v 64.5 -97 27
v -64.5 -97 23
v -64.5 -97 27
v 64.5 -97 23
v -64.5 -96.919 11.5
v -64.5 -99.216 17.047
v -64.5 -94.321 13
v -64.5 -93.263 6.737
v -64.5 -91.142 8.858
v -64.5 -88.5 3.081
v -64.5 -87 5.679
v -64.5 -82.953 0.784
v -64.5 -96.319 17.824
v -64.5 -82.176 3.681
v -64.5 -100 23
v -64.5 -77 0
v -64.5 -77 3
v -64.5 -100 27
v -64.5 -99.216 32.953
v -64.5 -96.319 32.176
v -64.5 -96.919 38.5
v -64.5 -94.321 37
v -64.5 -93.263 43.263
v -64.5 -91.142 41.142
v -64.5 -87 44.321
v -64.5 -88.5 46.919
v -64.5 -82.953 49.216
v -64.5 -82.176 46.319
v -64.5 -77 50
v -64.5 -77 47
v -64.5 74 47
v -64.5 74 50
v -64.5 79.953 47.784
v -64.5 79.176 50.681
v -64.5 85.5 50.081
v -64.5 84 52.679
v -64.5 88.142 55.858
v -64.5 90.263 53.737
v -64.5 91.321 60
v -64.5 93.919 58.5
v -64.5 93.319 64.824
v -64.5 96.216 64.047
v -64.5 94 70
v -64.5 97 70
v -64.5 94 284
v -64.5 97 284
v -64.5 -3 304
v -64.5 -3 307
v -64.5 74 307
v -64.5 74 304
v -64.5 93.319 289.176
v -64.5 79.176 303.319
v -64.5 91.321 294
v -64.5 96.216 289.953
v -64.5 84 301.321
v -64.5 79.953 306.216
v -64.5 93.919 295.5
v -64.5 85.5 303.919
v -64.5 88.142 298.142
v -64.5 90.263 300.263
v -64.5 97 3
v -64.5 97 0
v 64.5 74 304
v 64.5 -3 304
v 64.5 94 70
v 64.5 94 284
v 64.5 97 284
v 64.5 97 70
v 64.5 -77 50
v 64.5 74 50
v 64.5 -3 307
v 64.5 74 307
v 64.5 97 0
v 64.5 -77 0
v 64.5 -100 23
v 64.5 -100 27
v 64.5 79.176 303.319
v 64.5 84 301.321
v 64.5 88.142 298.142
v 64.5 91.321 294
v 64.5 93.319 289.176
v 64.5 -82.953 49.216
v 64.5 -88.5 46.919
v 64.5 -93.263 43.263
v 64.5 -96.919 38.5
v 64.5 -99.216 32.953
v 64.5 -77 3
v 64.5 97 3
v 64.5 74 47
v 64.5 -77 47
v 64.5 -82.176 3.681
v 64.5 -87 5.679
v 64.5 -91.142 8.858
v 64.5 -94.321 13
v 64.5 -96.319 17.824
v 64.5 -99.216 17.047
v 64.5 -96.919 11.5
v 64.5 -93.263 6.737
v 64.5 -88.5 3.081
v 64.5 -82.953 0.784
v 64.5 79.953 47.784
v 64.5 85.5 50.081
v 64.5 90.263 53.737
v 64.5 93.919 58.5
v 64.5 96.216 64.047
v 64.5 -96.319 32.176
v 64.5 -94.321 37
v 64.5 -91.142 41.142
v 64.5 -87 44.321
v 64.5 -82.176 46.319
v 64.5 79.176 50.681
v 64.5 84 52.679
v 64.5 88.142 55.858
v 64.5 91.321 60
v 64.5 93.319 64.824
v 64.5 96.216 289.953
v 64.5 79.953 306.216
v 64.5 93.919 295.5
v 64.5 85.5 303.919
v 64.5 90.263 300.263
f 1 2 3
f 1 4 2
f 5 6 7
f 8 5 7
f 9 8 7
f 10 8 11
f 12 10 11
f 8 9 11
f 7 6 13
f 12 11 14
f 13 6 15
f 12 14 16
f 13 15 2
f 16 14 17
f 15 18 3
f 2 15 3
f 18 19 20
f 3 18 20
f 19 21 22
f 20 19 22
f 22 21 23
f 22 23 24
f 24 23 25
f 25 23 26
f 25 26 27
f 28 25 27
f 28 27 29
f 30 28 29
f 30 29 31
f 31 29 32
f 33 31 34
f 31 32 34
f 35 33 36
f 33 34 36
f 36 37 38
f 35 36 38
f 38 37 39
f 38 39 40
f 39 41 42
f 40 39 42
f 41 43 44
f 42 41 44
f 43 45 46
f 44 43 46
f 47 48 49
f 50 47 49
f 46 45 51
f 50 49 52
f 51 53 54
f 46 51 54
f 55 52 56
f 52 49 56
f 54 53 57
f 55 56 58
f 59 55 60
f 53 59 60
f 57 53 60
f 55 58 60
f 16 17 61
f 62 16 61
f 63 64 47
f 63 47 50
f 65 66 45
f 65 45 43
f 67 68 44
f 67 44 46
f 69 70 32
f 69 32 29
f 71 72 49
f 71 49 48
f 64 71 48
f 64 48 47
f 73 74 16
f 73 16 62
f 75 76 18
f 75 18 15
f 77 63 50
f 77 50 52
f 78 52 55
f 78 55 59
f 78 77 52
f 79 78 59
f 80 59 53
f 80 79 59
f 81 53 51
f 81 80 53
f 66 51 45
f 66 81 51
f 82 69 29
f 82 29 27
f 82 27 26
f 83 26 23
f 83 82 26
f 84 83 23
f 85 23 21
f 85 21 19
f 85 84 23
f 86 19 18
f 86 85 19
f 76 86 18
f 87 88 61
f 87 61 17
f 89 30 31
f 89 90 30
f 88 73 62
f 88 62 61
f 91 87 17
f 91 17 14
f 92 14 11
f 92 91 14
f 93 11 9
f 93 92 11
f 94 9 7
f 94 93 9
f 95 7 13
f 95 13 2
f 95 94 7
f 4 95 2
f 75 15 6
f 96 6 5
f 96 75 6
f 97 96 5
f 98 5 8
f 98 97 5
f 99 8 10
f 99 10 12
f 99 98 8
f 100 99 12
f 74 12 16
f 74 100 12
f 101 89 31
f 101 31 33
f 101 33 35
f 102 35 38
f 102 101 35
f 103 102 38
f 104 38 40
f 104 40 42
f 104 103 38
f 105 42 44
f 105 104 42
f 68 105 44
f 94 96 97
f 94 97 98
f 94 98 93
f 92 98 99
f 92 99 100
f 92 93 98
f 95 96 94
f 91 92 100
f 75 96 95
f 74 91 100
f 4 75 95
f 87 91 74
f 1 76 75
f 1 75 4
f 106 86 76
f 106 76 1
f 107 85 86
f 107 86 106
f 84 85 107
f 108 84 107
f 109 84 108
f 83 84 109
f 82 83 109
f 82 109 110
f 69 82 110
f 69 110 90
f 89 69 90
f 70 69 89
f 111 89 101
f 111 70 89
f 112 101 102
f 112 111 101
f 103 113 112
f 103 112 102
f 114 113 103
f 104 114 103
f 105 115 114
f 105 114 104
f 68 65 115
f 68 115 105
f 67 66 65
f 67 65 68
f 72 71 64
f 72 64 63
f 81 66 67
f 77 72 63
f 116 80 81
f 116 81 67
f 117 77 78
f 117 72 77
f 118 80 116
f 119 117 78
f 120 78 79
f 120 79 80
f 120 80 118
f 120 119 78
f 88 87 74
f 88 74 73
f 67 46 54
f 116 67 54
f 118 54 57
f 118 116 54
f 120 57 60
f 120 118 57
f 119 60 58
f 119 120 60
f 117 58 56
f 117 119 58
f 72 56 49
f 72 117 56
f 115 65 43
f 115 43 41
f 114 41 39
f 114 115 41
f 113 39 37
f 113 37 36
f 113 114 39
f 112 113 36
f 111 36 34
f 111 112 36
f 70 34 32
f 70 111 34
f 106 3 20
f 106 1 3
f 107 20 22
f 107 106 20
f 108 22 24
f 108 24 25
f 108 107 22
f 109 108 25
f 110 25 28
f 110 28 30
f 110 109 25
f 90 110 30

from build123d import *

# Parameters (mm, degrees)
F1_DEPTH = 64.5


with BuildPart() as f1:
    # F0 (on Right) → F1 (new body, symmetric)
    with BuildSketch(Plane.YZ):
        with BuildLine():
            Line((-77, 47), (74, 47))
            ThreePointArc((74, 47), (90.263456, 53.736544), (97, 70))
            Line((97, 70), (97, 284))
            ThreePointArc((97, 284), (90.263456, 300.263456), (74, 307))
            Line((74, 307), (-3, 307))
            Line((-3, 307), (-3, 304))
            Line((-3, 304), (74, 304))
            ThreePointArc((74, 304), (88.142136, 298.142136), (94, 284))
            Line((94, 284), (94, 70))
            ThreePointArc((94, 70), (88.142136, 55.857864), (74, 50))
            Line((74, 50), (-77, 50))
            ThreePointArc((-77, 50), (-93.263456, 43.263456), (-100, 27))
            Line((-100, 27), (-100, 23))
            ThreePointArc((-100, 23), (-93.263456, 6.736544), (-77, 0))
            Line((-77, 0), (97, 0))
            Line((97, 0), (97, 3))
            Line((97, 3), (-77, 3))
            ThreePointArc((-77, 3), (-91.142136, 8.857864), (-97, 23))
            Line((-97, 23), (-97, 27))
            ThreePointArc((-97, 27), (-91.142136, 41.142136), (-77, 47))
        make_face()
    extrude(amount=F1_DEPTH, both=True)


solid = f1.part
